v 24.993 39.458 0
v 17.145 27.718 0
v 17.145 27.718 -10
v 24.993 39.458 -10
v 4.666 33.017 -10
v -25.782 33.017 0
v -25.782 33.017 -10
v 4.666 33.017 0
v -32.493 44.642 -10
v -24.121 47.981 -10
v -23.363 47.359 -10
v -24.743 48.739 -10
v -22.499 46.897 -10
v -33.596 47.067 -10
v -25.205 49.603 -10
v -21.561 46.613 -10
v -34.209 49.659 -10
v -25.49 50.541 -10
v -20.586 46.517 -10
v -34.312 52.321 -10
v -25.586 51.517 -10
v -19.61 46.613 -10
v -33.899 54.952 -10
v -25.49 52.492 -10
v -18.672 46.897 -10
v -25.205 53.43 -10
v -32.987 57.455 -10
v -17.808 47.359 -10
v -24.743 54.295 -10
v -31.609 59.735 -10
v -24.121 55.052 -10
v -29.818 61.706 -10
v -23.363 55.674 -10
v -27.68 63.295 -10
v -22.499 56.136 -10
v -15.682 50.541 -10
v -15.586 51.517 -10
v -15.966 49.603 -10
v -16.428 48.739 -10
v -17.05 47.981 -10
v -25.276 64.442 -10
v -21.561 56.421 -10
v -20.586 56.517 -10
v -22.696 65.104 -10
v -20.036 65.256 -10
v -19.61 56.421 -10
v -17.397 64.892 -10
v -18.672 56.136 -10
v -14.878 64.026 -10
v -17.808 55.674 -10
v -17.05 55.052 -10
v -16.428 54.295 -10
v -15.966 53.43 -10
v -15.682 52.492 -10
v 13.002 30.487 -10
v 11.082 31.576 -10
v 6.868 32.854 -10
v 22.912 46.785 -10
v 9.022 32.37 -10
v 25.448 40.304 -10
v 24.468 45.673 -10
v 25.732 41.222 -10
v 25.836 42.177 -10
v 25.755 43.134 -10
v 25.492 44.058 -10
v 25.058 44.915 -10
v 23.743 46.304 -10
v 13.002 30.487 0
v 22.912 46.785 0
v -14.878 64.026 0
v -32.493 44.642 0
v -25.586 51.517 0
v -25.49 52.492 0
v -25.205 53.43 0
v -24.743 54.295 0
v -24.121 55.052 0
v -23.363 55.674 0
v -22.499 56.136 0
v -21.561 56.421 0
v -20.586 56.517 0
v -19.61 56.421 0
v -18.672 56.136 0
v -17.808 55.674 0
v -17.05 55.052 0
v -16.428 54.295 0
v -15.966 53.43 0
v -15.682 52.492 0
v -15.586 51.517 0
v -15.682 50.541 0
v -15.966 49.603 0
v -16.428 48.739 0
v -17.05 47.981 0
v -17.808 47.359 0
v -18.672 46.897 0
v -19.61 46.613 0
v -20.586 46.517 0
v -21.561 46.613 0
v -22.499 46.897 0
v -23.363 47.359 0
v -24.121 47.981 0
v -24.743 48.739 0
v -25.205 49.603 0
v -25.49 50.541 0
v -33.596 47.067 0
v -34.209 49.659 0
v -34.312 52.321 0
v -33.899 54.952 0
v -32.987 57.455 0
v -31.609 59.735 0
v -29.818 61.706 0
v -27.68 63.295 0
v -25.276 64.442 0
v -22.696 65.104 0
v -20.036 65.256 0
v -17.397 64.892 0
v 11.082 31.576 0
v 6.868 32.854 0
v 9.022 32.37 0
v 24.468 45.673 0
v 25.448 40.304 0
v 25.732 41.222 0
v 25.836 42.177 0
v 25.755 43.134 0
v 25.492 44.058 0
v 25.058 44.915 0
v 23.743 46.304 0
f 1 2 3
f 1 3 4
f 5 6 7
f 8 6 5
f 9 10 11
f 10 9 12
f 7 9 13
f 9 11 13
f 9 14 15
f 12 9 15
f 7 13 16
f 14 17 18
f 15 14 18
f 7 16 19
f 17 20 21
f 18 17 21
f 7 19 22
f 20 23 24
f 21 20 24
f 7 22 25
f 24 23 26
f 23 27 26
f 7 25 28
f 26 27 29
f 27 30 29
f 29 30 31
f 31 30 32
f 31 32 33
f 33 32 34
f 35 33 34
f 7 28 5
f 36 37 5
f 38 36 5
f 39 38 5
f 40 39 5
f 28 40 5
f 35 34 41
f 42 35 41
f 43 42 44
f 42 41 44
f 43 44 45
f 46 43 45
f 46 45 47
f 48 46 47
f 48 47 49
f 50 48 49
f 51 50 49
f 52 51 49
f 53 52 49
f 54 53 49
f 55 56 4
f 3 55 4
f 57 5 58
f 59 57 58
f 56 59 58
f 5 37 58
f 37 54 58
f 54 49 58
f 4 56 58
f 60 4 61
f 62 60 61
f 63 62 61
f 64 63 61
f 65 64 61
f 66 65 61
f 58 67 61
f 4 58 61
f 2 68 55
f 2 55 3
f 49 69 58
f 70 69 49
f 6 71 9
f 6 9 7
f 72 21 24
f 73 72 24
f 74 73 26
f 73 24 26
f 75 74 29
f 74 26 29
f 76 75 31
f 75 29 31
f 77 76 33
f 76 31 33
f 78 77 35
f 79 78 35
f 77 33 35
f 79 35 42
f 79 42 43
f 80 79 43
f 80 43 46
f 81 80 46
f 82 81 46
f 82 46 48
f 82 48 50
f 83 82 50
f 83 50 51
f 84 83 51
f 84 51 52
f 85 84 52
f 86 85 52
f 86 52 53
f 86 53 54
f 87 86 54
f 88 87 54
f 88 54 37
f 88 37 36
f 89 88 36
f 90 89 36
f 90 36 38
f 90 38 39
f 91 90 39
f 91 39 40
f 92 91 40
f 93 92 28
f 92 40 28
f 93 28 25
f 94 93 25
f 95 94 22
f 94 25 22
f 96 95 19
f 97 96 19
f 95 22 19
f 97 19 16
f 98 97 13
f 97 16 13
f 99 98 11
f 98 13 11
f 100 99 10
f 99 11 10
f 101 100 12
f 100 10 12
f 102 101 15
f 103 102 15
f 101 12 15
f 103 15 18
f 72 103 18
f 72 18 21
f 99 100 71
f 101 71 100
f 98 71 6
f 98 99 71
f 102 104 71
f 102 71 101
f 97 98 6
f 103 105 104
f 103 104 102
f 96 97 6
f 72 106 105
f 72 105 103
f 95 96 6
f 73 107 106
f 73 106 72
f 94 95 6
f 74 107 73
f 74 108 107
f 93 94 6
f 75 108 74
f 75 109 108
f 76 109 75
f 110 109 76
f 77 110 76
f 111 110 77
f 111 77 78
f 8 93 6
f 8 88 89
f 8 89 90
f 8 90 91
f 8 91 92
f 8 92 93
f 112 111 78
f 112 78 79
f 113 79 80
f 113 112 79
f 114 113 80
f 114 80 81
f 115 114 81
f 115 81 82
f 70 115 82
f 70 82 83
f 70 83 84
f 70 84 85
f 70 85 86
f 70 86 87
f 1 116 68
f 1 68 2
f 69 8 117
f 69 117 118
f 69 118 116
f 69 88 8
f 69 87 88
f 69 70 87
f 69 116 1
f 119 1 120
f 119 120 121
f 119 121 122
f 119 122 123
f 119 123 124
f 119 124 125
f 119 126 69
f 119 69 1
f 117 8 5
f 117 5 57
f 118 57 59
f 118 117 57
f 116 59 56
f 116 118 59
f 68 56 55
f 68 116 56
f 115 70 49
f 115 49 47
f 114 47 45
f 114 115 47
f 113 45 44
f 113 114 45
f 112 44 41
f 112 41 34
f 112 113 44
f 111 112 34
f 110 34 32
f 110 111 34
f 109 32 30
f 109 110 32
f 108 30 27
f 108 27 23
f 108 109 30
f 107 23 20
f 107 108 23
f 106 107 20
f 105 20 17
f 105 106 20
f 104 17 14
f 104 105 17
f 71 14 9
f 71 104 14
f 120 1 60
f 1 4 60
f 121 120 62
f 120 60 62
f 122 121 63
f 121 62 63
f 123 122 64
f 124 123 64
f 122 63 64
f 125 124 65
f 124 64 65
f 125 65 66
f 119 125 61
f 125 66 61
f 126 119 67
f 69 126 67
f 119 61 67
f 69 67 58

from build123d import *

# Parameters (mm, degrees)
BASE_EXTRUDE_DEPTH = 10
SKETCH2_R          = 5
CUT_EXTRUDE1_DEPTH = 11
FILLET1_R          = 5


with BuildPart() as part:
    # Sketch1 → Base-Extrude (new body)
    with BuildSketch(Plane.XY):
        with BuildLine():
            Line((17.145241183, 27.717792456), (28.25998861, 44.344950651))
            Line((28.25998861, 44.344950651), (-14.878235452, 64.026276153))
            ThreePointArc((-14.878235452, 64.026276153), (-30.761612778, 60.763930789), (-32.493423944, 44.641728625))
            Line((-32.493423944, 44.641728625), (-25.781727065, 33.016728625))
            Line((-25.781727065, 33.016728625), (4.666426174, 33.016728625))
            ThreePointArc((4.666426174, 33.016728625), (9.022139107, 32.370395921), (13.002486744, 30.487097271))
            Line((13.002486744, 30.487097271), (17.145241183, 27.717792456))
        make_face()
    extrude(amount=-BASE_EXTRUDE_DEPTH)

    # Sketch2 → Cut-Extrude1 (cut, through all)
    with BuildSketch(Plane(origin=(0, 0, -10), x_dir=(-1, 0, 0), z_dir=(0, 0, -1))):
        with Locations((20.585574642, 51.516728625)):
            Circle(SKETCH2_R)
    extrude(amount=-CUT_EXTRUDE1_DEPTH, mode=Mode.SUBTRACT)

    # Fillet1
    fillet1_edges = [part.edges().sort_by_distance(p)[0] for p in [
        (28.25998861, 44.344950651, -5),
    ]]
    fillet(fillet1_edges, radius=FILLET1_R)


solid = part.part
